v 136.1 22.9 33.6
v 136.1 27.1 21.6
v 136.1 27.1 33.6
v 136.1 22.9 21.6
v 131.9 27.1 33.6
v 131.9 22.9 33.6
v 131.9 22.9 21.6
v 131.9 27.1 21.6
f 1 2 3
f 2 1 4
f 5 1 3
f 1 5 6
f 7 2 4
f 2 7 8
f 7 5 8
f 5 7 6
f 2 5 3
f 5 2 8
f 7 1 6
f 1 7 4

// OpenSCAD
// Generated by spec/prepare_parent_retrofit_printing.py from validated release fasteners. NOT A PRINTABLE PART.
union(){
translate([131.9, 22.9, 21.599999237060548]) cube([4.2, 4.2, 12.00000228881836]);
translate([131.9, 22.9, 21.599999237060548]) cube([4.2, 4.2, 12.00000228881836]);
}
